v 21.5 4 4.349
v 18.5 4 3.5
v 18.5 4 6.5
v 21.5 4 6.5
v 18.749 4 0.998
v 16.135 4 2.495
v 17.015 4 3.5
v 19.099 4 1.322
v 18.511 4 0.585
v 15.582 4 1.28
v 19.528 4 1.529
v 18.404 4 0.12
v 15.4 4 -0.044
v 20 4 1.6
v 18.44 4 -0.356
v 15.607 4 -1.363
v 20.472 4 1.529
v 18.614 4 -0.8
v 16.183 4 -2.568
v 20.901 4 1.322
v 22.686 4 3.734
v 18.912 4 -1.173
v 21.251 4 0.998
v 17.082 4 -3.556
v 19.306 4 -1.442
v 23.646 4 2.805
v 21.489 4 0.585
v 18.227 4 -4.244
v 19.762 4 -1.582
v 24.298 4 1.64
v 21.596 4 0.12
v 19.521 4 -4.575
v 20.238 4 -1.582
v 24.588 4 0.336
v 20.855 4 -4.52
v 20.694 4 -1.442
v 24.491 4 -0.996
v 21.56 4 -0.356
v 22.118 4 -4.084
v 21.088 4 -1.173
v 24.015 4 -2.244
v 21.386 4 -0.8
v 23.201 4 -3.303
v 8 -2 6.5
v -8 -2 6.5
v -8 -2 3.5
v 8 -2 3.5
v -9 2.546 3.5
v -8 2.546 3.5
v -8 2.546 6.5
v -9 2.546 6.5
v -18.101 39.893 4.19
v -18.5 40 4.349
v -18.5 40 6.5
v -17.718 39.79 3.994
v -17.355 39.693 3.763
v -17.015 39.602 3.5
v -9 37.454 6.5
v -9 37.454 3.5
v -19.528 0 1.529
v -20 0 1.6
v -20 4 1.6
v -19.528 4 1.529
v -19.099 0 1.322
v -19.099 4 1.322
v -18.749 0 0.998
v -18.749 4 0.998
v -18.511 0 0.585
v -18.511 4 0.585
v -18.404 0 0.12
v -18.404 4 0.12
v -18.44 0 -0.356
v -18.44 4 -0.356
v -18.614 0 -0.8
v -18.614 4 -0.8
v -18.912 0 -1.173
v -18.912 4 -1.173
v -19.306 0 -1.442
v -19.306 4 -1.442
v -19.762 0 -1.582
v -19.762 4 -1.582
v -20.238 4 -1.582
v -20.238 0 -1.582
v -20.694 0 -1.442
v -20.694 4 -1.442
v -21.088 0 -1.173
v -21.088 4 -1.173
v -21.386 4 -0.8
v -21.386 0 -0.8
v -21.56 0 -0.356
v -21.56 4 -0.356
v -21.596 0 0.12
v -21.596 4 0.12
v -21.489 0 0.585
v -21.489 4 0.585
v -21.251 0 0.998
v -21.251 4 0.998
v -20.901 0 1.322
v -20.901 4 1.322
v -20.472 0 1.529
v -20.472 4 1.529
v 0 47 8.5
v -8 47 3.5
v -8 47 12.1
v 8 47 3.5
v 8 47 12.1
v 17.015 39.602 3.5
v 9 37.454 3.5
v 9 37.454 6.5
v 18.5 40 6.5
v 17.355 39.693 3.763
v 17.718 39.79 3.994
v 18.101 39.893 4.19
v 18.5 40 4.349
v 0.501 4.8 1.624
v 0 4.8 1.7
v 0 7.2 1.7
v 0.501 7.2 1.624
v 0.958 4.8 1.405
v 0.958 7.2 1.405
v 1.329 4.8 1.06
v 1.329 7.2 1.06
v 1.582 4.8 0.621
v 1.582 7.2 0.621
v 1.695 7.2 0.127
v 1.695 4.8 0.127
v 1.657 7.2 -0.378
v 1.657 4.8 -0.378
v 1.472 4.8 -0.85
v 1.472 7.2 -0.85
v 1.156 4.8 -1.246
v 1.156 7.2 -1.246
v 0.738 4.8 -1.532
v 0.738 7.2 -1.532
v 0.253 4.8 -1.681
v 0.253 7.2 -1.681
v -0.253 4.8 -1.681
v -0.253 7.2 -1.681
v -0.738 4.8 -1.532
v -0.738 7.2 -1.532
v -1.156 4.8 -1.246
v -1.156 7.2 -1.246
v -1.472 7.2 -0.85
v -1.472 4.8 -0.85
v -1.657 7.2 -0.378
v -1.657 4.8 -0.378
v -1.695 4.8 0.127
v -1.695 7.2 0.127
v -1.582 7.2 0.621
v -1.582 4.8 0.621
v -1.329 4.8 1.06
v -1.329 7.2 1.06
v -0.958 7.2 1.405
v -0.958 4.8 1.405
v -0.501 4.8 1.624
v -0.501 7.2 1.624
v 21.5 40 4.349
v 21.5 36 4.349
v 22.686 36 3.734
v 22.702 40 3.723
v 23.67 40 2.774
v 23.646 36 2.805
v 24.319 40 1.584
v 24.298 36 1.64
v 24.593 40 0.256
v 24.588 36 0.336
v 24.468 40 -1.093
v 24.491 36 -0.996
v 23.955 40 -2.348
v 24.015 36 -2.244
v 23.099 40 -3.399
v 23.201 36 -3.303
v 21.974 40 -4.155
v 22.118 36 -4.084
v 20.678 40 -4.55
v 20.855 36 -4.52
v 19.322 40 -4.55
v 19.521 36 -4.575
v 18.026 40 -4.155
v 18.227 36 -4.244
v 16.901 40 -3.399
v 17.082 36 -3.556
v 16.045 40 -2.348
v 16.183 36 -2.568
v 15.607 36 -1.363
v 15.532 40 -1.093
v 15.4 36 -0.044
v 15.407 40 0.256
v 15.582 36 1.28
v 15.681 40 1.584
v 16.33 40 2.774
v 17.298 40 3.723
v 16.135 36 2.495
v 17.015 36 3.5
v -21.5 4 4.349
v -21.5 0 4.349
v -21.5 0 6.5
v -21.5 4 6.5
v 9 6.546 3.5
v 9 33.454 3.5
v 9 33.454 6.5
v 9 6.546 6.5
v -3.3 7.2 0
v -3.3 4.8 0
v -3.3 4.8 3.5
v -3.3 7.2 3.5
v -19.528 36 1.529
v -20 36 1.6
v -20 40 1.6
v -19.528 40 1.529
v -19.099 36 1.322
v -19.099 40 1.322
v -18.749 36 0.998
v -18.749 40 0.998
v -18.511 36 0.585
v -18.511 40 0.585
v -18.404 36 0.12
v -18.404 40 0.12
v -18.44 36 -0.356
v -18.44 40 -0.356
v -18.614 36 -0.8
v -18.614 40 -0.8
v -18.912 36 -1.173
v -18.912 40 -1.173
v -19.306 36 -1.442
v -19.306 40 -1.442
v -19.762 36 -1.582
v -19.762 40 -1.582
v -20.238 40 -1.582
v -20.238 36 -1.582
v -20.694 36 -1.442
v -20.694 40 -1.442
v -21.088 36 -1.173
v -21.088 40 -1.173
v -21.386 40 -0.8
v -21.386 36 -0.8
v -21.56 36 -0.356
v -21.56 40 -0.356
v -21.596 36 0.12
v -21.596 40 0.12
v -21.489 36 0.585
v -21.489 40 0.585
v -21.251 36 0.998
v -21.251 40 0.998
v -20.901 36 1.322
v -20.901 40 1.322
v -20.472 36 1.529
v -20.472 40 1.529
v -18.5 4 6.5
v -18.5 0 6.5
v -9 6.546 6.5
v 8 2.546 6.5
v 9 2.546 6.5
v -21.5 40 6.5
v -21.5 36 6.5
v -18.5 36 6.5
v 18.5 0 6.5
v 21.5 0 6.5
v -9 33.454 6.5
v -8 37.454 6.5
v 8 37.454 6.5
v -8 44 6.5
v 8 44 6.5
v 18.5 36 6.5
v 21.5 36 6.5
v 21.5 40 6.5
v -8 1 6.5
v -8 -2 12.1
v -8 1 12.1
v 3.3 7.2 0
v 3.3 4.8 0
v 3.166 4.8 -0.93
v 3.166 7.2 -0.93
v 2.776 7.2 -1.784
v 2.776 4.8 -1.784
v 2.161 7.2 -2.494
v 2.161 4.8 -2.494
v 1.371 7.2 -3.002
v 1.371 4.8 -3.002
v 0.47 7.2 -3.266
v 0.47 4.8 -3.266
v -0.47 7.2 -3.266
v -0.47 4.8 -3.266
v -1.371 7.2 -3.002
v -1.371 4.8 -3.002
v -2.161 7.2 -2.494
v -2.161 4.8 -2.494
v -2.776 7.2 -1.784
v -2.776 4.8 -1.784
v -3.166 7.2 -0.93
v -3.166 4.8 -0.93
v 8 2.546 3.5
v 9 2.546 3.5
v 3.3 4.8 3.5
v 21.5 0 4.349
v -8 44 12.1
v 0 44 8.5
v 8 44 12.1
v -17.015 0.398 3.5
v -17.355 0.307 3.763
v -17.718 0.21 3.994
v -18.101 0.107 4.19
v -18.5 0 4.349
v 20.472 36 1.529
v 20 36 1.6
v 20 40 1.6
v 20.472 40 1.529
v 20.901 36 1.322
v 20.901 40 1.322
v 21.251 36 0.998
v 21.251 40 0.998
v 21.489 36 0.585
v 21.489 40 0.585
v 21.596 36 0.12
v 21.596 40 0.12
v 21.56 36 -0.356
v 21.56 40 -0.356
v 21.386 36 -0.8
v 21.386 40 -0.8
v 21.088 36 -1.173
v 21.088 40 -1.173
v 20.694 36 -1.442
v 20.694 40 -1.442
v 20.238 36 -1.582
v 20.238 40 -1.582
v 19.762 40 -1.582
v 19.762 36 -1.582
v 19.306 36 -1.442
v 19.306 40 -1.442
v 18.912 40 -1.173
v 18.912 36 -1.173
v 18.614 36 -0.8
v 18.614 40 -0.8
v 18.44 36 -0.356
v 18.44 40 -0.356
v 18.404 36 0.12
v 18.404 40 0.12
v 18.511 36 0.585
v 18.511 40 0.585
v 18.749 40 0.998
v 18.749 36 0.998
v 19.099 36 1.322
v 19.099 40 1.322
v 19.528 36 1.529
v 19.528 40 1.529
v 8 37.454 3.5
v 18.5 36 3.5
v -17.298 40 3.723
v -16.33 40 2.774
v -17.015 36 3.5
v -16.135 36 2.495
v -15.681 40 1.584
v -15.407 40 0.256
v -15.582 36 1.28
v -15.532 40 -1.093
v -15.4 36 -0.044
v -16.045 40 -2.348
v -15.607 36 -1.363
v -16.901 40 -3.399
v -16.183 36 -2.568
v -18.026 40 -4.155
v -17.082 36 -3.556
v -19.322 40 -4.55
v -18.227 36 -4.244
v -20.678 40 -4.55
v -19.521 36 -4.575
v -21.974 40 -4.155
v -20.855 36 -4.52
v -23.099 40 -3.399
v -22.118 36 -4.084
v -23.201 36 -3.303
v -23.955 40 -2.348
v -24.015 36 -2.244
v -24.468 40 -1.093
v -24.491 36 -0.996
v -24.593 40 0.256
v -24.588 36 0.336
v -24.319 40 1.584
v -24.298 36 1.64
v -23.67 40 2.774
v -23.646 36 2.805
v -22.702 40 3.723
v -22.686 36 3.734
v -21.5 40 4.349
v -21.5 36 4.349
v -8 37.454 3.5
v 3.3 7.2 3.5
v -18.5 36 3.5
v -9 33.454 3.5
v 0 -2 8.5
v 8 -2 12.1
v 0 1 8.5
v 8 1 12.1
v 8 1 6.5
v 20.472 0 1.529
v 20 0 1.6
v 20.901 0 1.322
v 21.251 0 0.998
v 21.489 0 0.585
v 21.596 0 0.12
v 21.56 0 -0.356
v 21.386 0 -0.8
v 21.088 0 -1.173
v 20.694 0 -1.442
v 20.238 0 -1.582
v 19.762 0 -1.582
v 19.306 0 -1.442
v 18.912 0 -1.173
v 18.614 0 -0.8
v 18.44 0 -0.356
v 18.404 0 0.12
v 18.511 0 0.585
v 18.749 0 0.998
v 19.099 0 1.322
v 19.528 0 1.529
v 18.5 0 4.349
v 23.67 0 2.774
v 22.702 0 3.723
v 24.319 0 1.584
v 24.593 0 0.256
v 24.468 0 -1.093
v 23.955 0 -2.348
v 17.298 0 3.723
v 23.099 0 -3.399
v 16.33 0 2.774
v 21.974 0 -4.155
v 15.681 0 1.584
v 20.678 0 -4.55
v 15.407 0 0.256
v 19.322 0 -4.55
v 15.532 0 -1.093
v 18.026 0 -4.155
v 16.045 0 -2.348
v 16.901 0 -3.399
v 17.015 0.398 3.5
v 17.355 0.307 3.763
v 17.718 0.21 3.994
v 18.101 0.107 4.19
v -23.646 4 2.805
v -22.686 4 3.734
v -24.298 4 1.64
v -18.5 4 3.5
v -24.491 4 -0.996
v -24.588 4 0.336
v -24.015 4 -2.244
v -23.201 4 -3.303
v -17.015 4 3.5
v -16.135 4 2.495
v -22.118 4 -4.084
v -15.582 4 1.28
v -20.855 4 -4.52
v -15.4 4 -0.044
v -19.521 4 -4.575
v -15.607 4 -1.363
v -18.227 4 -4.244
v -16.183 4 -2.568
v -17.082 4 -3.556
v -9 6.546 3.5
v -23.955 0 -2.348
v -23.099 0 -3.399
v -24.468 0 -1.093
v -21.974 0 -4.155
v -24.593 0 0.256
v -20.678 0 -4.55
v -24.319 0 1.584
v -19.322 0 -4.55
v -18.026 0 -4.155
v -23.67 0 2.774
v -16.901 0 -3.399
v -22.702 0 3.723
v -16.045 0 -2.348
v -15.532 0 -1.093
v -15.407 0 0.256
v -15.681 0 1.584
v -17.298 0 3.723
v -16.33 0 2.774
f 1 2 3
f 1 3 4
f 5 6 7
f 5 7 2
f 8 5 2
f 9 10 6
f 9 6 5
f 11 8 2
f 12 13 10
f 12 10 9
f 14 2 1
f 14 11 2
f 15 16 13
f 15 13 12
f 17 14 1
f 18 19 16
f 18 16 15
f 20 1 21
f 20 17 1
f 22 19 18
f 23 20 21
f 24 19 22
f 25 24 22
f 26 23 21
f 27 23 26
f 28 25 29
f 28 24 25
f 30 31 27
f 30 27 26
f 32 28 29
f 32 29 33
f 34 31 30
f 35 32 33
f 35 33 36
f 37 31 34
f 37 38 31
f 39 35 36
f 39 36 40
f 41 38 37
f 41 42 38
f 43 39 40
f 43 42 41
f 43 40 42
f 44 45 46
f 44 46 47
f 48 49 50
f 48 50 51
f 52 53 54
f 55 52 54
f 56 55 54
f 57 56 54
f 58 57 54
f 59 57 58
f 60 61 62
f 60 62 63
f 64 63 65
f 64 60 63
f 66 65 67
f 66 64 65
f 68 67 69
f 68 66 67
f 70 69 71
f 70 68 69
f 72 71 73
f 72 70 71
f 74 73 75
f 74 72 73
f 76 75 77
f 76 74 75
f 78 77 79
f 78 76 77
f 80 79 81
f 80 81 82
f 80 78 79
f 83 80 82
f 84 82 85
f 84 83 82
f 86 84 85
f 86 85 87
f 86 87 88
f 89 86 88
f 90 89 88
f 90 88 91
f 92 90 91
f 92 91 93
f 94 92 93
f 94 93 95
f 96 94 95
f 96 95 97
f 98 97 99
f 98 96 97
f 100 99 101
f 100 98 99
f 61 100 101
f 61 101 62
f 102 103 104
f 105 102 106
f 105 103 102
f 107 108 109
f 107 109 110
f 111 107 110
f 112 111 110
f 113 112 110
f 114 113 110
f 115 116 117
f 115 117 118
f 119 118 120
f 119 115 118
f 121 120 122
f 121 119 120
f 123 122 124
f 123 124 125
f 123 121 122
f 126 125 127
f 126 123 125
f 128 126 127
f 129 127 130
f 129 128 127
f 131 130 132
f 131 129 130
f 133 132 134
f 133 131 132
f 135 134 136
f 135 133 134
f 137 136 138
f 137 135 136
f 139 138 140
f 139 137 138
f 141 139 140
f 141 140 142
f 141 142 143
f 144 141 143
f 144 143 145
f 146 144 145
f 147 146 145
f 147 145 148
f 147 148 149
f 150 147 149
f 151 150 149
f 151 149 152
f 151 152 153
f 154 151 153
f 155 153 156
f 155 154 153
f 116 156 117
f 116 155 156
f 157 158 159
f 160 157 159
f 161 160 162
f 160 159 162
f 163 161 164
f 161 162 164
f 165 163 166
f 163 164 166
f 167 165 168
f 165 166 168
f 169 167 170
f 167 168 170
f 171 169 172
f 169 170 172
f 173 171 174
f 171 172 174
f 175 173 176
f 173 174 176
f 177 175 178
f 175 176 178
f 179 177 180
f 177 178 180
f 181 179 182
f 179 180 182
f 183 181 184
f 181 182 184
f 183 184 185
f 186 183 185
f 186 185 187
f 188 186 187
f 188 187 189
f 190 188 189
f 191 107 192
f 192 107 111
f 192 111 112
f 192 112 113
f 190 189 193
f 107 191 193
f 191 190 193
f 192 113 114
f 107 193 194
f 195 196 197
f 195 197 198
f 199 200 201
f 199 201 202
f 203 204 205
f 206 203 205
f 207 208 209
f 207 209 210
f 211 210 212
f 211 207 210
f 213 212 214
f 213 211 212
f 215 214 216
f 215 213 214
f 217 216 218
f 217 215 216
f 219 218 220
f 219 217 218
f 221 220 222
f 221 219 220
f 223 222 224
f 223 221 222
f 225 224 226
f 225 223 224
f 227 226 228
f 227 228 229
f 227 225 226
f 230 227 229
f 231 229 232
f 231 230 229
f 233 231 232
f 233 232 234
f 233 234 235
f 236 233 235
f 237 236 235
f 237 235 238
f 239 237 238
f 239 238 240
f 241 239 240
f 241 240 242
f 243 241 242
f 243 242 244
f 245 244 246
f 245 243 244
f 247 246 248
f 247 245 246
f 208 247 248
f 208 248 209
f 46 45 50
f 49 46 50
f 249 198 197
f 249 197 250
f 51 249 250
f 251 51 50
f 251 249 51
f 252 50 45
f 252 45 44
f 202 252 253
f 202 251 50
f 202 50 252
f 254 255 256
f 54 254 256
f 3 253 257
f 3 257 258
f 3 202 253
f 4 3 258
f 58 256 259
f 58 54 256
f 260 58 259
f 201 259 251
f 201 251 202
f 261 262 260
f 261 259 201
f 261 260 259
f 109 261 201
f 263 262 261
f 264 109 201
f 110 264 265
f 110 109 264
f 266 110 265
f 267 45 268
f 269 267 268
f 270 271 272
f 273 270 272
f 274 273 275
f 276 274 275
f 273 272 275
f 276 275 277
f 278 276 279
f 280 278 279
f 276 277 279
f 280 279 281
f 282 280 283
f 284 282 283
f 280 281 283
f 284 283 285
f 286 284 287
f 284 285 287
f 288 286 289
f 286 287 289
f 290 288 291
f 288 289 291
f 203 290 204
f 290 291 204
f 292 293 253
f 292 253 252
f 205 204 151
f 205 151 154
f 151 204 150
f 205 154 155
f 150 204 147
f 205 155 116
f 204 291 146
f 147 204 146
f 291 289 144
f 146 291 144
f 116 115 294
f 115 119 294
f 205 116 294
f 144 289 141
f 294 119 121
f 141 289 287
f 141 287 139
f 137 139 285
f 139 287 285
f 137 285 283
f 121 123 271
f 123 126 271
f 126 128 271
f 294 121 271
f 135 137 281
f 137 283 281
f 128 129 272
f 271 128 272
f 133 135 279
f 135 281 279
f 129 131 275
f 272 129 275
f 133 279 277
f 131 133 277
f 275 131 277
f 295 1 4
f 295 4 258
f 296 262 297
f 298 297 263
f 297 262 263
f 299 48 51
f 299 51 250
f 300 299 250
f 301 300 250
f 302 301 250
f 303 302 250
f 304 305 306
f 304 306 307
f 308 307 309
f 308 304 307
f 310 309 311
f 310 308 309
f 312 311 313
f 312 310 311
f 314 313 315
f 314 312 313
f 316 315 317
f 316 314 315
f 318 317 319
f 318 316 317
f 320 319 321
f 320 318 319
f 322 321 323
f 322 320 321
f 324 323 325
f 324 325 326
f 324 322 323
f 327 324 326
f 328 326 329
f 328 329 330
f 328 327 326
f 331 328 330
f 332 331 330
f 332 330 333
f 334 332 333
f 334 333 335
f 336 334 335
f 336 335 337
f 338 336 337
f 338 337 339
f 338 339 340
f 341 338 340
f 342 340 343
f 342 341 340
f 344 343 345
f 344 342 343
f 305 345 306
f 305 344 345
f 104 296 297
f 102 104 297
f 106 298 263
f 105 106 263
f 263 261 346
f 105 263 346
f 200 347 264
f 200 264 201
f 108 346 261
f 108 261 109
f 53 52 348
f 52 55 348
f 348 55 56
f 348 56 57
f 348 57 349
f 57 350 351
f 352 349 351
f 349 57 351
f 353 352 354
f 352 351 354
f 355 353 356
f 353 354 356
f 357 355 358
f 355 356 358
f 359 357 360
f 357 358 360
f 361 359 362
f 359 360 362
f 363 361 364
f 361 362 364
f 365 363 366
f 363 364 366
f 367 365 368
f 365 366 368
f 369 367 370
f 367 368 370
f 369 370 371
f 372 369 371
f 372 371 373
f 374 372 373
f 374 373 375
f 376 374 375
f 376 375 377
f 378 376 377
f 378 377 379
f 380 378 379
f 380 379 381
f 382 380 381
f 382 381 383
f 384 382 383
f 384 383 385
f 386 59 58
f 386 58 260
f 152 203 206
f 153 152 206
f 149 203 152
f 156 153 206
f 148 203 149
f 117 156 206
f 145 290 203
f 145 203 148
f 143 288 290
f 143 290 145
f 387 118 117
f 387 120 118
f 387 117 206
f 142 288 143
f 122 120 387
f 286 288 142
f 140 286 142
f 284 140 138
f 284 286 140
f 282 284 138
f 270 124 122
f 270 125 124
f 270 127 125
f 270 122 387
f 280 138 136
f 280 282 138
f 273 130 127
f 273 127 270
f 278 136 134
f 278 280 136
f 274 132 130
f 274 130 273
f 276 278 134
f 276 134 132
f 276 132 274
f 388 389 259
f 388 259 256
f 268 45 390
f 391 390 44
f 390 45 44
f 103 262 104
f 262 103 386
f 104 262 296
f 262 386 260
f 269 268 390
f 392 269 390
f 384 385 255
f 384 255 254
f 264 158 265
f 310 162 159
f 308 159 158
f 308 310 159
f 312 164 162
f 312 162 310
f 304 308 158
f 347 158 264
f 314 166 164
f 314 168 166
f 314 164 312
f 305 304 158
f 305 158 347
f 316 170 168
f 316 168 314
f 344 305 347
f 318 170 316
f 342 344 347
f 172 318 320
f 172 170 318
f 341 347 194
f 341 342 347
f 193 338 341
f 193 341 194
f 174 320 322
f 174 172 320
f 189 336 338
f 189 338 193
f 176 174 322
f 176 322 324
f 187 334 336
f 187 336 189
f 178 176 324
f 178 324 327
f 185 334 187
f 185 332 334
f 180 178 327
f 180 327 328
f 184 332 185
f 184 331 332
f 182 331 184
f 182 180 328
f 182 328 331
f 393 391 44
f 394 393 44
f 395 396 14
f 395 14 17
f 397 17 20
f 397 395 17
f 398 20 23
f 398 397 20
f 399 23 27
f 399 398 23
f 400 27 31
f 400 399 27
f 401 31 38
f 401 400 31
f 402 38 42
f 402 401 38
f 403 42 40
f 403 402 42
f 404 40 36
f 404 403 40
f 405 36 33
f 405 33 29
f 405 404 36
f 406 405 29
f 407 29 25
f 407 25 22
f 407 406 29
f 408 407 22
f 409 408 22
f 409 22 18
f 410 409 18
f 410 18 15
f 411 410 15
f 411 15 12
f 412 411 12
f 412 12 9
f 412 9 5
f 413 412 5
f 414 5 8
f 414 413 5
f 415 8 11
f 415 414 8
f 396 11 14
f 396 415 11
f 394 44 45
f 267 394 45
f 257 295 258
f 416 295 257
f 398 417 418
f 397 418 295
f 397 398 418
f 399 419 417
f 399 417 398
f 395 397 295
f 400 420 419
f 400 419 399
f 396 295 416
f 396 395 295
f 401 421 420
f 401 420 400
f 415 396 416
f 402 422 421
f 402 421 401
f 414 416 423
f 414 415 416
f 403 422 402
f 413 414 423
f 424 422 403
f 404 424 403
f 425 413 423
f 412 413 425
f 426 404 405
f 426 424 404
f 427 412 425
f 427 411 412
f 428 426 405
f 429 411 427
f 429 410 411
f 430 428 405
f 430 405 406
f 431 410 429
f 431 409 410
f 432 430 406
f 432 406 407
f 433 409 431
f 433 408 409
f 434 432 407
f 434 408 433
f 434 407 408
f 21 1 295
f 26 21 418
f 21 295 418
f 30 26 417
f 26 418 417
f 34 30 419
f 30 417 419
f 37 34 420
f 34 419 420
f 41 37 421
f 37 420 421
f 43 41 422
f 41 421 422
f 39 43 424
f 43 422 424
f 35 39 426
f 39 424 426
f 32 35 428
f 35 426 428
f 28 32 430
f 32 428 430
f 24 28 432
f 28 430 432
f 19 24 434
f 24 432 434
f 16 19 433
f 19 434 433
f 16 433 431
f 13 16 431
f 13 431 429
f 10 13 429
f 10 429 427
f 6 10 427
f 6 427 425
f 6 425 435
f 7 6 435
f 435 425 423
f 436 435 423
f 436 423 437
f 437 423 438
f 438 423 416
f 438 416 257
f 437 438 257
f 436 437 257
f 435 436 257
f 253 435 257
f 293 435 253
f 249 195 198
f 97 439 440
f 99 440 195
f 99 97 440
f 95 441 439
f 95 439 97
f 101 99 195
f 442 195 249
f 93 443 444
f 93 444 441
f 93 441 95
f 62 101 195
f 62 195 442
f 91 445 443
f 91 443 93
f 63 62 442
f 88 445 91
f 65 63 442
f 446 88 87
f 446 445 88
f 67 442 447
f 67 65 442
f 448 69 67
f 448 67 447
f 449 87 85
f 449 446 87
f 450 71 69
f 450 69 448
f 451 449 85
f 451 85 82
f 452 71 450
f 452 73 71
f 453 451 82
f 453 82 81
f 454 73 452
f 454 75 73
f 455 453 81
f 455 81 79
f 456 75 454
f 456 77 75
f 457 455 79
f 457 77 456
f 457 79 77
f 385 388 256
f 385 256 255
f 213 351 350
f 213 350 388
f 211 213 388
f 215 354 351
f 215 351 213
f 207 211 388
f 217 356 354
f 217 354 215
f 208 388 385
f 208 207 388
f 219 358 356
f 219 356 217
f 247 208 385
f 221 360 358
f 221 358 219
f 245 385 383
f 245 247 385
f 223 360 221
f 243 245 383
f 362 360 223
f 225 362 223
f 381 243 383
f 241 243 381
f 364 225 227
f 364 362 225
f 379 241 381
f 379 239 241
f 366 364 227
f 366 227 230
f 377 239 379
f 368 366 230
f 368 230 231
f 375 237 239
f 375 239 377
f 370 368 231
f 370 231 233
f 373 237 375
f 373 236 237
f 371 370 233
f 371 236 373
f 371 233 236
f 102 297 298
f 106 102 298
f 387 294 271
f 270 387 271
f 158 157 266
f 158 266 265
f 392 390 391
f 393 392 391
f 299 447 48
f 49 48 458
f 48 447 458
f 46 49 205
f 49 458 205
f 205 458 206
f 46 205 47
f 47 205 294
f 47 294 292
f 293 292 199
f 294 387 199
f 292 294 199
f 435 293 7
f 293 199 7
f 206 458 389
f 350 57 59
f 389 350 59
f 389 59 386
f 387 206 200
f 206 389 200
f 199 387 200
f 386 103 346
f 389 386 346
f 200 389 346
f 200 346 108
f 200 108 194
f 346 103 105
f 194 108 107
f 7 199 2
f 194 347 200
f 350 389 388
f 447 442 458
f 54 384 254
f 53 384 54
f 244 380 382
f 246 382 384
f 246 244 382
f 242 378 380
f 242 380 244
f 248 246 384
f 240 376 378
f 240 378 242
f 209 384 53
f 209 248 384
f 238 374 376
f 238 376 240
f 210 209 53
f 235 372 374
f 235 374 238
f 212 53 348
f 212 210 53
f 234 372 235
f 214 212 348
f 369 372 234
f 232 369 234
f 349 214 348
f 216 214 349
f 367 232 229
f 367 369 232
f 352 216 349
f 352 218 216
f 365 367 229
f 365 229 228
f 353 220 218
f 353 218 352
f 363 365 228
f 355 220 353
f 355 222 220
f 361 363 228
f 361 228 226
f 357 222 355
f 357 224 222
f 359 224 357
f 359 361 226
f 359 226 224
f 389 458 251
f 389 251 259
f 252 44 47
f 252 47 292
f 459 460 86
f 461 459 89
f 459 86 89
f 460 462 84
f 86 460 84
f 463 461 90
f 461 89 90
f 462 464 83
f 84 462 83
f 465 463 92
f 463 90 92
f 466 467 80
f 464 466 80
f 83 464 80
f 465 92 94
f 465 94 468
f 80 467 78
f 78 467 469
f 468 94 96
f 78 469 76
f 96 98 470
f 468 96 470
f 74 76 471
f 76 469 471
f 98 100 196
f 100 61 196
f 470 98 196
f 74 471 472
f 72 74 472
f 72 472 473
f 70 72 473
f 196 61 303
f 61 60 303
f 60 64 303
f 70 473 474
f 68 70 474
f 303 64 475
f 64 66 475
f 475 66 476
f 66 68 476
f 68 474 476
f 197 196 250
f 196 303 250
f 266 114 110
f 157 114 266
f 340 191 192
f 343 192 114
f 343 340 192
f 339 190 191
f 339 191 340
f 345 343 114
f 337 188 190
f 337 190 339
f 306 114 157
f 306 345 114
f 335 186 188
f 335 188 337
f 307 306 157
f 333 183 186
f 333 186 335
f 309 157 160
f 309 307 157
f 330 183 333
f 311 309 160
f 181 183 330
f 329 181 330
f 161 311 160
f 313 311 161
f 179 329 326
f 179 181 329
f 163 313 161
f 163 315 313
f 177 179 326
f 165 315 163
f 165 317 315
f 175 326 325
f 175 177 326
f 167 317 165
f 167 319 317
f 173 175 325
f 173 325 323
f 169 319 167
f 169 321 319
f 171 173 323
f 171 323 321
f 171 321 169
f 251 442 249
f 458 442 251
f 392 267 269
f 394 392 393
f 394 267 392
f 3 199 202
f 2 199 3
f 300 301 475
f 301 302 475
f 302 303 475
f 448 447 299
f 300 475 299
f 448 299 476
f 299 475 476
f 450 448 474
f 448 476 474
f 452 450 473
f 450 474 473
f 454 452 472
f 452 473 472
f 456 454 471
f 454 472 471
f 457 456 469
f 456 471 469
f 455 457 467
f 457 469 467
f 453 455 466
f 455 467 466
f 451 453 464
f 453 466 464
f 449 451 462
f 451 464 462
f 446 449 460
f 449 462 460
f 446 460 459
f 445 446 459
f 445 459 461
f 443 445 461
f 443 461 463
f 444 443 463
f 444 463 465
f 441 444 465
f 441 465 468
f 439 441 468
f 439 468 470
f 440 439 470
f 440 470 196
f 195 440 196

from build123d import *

# Parameters (mm, degrees)
SKETCH2_R             = 4.6
SKETCH2_R_2           = 1.6
BOSS_EXTRUDE1_DEPTH   = 4
BOSS_EXTRUDE1_2_DEPTH = 4
LPATTERN1_COUNT       = 2
LPATTERN1_PITCH       = 36
BOSS_EXTRUDE5_DEPTH   = 3
BOSS_EXTRUDE6_START   = 4.8
B_E_SPRING_PLATE_R    = 1.7
BOSS_EXTRUDE6_DEPTH   = 2.4
SKETCH10_W            = 16
SKETCH10_H            = 49
BOSS_EXTRUDE8_DEPTH   = 3
BOSS_EXTRUDE7_START   = -2
BOSS_EXTRUDE7_DEPTH   = 3
BOSS_EXTRUDE9_START   = 44
BOSS_EXTRUDE9_DEPTH   = 3


with BuildPart() as part:
    # Sketch2 → Boss-Extrude1 (new body)
    with BuildSketch(Plane(origin=(0, 0, 0), x_dir=(1, 0, 0), z_dir=(0, 1, 0))):
        with Locations(Location((-20, 0, 0), (0, 0, 270))):
            Circle(SKETCH2_R)
        with Locations(Location((-20, 0, 0), (0, 0, 270))):
            Circle(SKETCH2_R_2, mode=Mode.SUBTRACT)
    boss_extrude1 = extrude(amount=BOSS_EXTRUDE1_DEPTH)



with BuildPart() as body_2:
    # Sketch2 → Boss-Extrude1 2 (new body)
    with BuildSketch(Plane(origin=(0, 0, 0), x_dir=(1, 0, 0), z_dir=(0, 1, 0))):
        with Locations(Location((20, 0, 0), (0, 0, 270))):
            Circle(SKETCH2_R)
        with Locations(Location((20, 0, 0), (0, 0, 270))):
            Circle(SKETCH2_R_2, mode=Mode.SUBTRACT)
    boss_extrude1_2 = extrude(amount=BOSS_EXTRUDE1_2_DEPTH)


with BuildPart() as lpattern1_1:
    # LPattern1: pattern copy
    add(boss_extrude1.moved(Location(Vector(0, 1, 0) * (1 * LPATTERN1_PITCH))))


with BuildPart() as lpattern1_2:
    # LPattern1: pattern copy
    add(boss_extrude1_2.moved(Location(Vector(0, 1, 0) * (1 * LPATTERN1_PITCH))))


with BuildPart() as part_1:
    add(part.part)

    add(body_2.part)  # Boss-Extrude5 merges body 2

    add(lpattern1_1.part)  # Boss-Extrude5 merges LPattern1_1

    add(lpattern1_2.part)  # Boss-Extrude5 merges LPattern1_2
    # Sketch7 → Boss-Extrude5 (add)
    with BuildSketch(Plane.XY.offset(3.5)):
        Polygon((-21.5, 0), (-21.5, 4), (-18.5, 4), (-9, 6.545517328), (-9, 33.454482672), (-18.5, 36), (-21.5, 36), (-21.5, 40), (-18.5, 40), (-9, 37.454482672), (9, 37.454482672), (18.5, 40), (21.5, 40), (21.5, 36), (18.5, 36), (9, 33.454482672), (9, 6.545517328), (18.5, 4), (21.5, 4), (21.5, 0), (18.5, 0), (9, 2.545517328), (-9, 2.545517328), (-18.5, 0), align=None)
    extrude(amount=BOSS_EXTRUDE5_DEPTH)

    # b.e. spring plate → Boss-Extrude6 (add)
    with BuildSketch(Plane(origin=(0, 0, 0), x_dir=(1, 0, 0), z_dir=(0, 1, 0)).offset(BOSS_EXTRUDE6_START)):
        with BuildLine():
            Line((-3.3, 0), (-3.3, -3.5))
            Line((-3.3, -3.5), (3.3, -3.5))
            Line((3.3, -3.5), (3.3, 0))
            ThreePointArc((3.3, 0), (0, 3.3), (-3.3, 0))
        make_face()
        with Locations(Location((0, 0, 0), (0, 0, 270))):
            Circle(B_E_SPRING_PLATE_R, mode=Mode.SUBTRACT)
    extrude(amount=BOSS_EXTRUDE6_DEPTH)

    # Sketch10 → Boss-Extrude8 (add)
    with BuildSketch(Plane.XY.offset(6.5)):
        with Locations((0, 22.5)):
            Rectangle(SKETCH10_W, SKETCH10_H)
    extrude(amount=-BOSS_EXTRUDE8_DEPTH)

    # b.e. pen holder<3> → Boss-Extrude9 (add)
    with BuildSketch(Plane(origin=(0, 0, 0), x_dir=(1, 0, 0), z_dir=(0, 1, 0)).offset(BOSS_EXTRUDE9_START)):
        Polygon((-8, -6.5), (-8, -12.1), (0, -8.5), (8, -12.1), (8, -6.5), align=None)
    extrude(amount=BOSS_EXTRUDE9_DEPTH)


with BuildPart() as body_2_2:
    # b.e. pen holder → Boss-Extrude7 (new body)
    with BuildSketch(Plane(origin=(0, 0, 0), x_dir=(1, 0, 0), z_dir=(0, 1, 0)).offset(BOSS_EXTRUDE7_START)):
        Polygon((-8, -6.5), (-8, -12.1), (0, -8.5), (8, -12.1), (8, -6.5), align=None)
    extrude(amount=BOSS_EXTRUDE7_DEPTH)


solid = Compound([part_1.part, body_2_2.part])
